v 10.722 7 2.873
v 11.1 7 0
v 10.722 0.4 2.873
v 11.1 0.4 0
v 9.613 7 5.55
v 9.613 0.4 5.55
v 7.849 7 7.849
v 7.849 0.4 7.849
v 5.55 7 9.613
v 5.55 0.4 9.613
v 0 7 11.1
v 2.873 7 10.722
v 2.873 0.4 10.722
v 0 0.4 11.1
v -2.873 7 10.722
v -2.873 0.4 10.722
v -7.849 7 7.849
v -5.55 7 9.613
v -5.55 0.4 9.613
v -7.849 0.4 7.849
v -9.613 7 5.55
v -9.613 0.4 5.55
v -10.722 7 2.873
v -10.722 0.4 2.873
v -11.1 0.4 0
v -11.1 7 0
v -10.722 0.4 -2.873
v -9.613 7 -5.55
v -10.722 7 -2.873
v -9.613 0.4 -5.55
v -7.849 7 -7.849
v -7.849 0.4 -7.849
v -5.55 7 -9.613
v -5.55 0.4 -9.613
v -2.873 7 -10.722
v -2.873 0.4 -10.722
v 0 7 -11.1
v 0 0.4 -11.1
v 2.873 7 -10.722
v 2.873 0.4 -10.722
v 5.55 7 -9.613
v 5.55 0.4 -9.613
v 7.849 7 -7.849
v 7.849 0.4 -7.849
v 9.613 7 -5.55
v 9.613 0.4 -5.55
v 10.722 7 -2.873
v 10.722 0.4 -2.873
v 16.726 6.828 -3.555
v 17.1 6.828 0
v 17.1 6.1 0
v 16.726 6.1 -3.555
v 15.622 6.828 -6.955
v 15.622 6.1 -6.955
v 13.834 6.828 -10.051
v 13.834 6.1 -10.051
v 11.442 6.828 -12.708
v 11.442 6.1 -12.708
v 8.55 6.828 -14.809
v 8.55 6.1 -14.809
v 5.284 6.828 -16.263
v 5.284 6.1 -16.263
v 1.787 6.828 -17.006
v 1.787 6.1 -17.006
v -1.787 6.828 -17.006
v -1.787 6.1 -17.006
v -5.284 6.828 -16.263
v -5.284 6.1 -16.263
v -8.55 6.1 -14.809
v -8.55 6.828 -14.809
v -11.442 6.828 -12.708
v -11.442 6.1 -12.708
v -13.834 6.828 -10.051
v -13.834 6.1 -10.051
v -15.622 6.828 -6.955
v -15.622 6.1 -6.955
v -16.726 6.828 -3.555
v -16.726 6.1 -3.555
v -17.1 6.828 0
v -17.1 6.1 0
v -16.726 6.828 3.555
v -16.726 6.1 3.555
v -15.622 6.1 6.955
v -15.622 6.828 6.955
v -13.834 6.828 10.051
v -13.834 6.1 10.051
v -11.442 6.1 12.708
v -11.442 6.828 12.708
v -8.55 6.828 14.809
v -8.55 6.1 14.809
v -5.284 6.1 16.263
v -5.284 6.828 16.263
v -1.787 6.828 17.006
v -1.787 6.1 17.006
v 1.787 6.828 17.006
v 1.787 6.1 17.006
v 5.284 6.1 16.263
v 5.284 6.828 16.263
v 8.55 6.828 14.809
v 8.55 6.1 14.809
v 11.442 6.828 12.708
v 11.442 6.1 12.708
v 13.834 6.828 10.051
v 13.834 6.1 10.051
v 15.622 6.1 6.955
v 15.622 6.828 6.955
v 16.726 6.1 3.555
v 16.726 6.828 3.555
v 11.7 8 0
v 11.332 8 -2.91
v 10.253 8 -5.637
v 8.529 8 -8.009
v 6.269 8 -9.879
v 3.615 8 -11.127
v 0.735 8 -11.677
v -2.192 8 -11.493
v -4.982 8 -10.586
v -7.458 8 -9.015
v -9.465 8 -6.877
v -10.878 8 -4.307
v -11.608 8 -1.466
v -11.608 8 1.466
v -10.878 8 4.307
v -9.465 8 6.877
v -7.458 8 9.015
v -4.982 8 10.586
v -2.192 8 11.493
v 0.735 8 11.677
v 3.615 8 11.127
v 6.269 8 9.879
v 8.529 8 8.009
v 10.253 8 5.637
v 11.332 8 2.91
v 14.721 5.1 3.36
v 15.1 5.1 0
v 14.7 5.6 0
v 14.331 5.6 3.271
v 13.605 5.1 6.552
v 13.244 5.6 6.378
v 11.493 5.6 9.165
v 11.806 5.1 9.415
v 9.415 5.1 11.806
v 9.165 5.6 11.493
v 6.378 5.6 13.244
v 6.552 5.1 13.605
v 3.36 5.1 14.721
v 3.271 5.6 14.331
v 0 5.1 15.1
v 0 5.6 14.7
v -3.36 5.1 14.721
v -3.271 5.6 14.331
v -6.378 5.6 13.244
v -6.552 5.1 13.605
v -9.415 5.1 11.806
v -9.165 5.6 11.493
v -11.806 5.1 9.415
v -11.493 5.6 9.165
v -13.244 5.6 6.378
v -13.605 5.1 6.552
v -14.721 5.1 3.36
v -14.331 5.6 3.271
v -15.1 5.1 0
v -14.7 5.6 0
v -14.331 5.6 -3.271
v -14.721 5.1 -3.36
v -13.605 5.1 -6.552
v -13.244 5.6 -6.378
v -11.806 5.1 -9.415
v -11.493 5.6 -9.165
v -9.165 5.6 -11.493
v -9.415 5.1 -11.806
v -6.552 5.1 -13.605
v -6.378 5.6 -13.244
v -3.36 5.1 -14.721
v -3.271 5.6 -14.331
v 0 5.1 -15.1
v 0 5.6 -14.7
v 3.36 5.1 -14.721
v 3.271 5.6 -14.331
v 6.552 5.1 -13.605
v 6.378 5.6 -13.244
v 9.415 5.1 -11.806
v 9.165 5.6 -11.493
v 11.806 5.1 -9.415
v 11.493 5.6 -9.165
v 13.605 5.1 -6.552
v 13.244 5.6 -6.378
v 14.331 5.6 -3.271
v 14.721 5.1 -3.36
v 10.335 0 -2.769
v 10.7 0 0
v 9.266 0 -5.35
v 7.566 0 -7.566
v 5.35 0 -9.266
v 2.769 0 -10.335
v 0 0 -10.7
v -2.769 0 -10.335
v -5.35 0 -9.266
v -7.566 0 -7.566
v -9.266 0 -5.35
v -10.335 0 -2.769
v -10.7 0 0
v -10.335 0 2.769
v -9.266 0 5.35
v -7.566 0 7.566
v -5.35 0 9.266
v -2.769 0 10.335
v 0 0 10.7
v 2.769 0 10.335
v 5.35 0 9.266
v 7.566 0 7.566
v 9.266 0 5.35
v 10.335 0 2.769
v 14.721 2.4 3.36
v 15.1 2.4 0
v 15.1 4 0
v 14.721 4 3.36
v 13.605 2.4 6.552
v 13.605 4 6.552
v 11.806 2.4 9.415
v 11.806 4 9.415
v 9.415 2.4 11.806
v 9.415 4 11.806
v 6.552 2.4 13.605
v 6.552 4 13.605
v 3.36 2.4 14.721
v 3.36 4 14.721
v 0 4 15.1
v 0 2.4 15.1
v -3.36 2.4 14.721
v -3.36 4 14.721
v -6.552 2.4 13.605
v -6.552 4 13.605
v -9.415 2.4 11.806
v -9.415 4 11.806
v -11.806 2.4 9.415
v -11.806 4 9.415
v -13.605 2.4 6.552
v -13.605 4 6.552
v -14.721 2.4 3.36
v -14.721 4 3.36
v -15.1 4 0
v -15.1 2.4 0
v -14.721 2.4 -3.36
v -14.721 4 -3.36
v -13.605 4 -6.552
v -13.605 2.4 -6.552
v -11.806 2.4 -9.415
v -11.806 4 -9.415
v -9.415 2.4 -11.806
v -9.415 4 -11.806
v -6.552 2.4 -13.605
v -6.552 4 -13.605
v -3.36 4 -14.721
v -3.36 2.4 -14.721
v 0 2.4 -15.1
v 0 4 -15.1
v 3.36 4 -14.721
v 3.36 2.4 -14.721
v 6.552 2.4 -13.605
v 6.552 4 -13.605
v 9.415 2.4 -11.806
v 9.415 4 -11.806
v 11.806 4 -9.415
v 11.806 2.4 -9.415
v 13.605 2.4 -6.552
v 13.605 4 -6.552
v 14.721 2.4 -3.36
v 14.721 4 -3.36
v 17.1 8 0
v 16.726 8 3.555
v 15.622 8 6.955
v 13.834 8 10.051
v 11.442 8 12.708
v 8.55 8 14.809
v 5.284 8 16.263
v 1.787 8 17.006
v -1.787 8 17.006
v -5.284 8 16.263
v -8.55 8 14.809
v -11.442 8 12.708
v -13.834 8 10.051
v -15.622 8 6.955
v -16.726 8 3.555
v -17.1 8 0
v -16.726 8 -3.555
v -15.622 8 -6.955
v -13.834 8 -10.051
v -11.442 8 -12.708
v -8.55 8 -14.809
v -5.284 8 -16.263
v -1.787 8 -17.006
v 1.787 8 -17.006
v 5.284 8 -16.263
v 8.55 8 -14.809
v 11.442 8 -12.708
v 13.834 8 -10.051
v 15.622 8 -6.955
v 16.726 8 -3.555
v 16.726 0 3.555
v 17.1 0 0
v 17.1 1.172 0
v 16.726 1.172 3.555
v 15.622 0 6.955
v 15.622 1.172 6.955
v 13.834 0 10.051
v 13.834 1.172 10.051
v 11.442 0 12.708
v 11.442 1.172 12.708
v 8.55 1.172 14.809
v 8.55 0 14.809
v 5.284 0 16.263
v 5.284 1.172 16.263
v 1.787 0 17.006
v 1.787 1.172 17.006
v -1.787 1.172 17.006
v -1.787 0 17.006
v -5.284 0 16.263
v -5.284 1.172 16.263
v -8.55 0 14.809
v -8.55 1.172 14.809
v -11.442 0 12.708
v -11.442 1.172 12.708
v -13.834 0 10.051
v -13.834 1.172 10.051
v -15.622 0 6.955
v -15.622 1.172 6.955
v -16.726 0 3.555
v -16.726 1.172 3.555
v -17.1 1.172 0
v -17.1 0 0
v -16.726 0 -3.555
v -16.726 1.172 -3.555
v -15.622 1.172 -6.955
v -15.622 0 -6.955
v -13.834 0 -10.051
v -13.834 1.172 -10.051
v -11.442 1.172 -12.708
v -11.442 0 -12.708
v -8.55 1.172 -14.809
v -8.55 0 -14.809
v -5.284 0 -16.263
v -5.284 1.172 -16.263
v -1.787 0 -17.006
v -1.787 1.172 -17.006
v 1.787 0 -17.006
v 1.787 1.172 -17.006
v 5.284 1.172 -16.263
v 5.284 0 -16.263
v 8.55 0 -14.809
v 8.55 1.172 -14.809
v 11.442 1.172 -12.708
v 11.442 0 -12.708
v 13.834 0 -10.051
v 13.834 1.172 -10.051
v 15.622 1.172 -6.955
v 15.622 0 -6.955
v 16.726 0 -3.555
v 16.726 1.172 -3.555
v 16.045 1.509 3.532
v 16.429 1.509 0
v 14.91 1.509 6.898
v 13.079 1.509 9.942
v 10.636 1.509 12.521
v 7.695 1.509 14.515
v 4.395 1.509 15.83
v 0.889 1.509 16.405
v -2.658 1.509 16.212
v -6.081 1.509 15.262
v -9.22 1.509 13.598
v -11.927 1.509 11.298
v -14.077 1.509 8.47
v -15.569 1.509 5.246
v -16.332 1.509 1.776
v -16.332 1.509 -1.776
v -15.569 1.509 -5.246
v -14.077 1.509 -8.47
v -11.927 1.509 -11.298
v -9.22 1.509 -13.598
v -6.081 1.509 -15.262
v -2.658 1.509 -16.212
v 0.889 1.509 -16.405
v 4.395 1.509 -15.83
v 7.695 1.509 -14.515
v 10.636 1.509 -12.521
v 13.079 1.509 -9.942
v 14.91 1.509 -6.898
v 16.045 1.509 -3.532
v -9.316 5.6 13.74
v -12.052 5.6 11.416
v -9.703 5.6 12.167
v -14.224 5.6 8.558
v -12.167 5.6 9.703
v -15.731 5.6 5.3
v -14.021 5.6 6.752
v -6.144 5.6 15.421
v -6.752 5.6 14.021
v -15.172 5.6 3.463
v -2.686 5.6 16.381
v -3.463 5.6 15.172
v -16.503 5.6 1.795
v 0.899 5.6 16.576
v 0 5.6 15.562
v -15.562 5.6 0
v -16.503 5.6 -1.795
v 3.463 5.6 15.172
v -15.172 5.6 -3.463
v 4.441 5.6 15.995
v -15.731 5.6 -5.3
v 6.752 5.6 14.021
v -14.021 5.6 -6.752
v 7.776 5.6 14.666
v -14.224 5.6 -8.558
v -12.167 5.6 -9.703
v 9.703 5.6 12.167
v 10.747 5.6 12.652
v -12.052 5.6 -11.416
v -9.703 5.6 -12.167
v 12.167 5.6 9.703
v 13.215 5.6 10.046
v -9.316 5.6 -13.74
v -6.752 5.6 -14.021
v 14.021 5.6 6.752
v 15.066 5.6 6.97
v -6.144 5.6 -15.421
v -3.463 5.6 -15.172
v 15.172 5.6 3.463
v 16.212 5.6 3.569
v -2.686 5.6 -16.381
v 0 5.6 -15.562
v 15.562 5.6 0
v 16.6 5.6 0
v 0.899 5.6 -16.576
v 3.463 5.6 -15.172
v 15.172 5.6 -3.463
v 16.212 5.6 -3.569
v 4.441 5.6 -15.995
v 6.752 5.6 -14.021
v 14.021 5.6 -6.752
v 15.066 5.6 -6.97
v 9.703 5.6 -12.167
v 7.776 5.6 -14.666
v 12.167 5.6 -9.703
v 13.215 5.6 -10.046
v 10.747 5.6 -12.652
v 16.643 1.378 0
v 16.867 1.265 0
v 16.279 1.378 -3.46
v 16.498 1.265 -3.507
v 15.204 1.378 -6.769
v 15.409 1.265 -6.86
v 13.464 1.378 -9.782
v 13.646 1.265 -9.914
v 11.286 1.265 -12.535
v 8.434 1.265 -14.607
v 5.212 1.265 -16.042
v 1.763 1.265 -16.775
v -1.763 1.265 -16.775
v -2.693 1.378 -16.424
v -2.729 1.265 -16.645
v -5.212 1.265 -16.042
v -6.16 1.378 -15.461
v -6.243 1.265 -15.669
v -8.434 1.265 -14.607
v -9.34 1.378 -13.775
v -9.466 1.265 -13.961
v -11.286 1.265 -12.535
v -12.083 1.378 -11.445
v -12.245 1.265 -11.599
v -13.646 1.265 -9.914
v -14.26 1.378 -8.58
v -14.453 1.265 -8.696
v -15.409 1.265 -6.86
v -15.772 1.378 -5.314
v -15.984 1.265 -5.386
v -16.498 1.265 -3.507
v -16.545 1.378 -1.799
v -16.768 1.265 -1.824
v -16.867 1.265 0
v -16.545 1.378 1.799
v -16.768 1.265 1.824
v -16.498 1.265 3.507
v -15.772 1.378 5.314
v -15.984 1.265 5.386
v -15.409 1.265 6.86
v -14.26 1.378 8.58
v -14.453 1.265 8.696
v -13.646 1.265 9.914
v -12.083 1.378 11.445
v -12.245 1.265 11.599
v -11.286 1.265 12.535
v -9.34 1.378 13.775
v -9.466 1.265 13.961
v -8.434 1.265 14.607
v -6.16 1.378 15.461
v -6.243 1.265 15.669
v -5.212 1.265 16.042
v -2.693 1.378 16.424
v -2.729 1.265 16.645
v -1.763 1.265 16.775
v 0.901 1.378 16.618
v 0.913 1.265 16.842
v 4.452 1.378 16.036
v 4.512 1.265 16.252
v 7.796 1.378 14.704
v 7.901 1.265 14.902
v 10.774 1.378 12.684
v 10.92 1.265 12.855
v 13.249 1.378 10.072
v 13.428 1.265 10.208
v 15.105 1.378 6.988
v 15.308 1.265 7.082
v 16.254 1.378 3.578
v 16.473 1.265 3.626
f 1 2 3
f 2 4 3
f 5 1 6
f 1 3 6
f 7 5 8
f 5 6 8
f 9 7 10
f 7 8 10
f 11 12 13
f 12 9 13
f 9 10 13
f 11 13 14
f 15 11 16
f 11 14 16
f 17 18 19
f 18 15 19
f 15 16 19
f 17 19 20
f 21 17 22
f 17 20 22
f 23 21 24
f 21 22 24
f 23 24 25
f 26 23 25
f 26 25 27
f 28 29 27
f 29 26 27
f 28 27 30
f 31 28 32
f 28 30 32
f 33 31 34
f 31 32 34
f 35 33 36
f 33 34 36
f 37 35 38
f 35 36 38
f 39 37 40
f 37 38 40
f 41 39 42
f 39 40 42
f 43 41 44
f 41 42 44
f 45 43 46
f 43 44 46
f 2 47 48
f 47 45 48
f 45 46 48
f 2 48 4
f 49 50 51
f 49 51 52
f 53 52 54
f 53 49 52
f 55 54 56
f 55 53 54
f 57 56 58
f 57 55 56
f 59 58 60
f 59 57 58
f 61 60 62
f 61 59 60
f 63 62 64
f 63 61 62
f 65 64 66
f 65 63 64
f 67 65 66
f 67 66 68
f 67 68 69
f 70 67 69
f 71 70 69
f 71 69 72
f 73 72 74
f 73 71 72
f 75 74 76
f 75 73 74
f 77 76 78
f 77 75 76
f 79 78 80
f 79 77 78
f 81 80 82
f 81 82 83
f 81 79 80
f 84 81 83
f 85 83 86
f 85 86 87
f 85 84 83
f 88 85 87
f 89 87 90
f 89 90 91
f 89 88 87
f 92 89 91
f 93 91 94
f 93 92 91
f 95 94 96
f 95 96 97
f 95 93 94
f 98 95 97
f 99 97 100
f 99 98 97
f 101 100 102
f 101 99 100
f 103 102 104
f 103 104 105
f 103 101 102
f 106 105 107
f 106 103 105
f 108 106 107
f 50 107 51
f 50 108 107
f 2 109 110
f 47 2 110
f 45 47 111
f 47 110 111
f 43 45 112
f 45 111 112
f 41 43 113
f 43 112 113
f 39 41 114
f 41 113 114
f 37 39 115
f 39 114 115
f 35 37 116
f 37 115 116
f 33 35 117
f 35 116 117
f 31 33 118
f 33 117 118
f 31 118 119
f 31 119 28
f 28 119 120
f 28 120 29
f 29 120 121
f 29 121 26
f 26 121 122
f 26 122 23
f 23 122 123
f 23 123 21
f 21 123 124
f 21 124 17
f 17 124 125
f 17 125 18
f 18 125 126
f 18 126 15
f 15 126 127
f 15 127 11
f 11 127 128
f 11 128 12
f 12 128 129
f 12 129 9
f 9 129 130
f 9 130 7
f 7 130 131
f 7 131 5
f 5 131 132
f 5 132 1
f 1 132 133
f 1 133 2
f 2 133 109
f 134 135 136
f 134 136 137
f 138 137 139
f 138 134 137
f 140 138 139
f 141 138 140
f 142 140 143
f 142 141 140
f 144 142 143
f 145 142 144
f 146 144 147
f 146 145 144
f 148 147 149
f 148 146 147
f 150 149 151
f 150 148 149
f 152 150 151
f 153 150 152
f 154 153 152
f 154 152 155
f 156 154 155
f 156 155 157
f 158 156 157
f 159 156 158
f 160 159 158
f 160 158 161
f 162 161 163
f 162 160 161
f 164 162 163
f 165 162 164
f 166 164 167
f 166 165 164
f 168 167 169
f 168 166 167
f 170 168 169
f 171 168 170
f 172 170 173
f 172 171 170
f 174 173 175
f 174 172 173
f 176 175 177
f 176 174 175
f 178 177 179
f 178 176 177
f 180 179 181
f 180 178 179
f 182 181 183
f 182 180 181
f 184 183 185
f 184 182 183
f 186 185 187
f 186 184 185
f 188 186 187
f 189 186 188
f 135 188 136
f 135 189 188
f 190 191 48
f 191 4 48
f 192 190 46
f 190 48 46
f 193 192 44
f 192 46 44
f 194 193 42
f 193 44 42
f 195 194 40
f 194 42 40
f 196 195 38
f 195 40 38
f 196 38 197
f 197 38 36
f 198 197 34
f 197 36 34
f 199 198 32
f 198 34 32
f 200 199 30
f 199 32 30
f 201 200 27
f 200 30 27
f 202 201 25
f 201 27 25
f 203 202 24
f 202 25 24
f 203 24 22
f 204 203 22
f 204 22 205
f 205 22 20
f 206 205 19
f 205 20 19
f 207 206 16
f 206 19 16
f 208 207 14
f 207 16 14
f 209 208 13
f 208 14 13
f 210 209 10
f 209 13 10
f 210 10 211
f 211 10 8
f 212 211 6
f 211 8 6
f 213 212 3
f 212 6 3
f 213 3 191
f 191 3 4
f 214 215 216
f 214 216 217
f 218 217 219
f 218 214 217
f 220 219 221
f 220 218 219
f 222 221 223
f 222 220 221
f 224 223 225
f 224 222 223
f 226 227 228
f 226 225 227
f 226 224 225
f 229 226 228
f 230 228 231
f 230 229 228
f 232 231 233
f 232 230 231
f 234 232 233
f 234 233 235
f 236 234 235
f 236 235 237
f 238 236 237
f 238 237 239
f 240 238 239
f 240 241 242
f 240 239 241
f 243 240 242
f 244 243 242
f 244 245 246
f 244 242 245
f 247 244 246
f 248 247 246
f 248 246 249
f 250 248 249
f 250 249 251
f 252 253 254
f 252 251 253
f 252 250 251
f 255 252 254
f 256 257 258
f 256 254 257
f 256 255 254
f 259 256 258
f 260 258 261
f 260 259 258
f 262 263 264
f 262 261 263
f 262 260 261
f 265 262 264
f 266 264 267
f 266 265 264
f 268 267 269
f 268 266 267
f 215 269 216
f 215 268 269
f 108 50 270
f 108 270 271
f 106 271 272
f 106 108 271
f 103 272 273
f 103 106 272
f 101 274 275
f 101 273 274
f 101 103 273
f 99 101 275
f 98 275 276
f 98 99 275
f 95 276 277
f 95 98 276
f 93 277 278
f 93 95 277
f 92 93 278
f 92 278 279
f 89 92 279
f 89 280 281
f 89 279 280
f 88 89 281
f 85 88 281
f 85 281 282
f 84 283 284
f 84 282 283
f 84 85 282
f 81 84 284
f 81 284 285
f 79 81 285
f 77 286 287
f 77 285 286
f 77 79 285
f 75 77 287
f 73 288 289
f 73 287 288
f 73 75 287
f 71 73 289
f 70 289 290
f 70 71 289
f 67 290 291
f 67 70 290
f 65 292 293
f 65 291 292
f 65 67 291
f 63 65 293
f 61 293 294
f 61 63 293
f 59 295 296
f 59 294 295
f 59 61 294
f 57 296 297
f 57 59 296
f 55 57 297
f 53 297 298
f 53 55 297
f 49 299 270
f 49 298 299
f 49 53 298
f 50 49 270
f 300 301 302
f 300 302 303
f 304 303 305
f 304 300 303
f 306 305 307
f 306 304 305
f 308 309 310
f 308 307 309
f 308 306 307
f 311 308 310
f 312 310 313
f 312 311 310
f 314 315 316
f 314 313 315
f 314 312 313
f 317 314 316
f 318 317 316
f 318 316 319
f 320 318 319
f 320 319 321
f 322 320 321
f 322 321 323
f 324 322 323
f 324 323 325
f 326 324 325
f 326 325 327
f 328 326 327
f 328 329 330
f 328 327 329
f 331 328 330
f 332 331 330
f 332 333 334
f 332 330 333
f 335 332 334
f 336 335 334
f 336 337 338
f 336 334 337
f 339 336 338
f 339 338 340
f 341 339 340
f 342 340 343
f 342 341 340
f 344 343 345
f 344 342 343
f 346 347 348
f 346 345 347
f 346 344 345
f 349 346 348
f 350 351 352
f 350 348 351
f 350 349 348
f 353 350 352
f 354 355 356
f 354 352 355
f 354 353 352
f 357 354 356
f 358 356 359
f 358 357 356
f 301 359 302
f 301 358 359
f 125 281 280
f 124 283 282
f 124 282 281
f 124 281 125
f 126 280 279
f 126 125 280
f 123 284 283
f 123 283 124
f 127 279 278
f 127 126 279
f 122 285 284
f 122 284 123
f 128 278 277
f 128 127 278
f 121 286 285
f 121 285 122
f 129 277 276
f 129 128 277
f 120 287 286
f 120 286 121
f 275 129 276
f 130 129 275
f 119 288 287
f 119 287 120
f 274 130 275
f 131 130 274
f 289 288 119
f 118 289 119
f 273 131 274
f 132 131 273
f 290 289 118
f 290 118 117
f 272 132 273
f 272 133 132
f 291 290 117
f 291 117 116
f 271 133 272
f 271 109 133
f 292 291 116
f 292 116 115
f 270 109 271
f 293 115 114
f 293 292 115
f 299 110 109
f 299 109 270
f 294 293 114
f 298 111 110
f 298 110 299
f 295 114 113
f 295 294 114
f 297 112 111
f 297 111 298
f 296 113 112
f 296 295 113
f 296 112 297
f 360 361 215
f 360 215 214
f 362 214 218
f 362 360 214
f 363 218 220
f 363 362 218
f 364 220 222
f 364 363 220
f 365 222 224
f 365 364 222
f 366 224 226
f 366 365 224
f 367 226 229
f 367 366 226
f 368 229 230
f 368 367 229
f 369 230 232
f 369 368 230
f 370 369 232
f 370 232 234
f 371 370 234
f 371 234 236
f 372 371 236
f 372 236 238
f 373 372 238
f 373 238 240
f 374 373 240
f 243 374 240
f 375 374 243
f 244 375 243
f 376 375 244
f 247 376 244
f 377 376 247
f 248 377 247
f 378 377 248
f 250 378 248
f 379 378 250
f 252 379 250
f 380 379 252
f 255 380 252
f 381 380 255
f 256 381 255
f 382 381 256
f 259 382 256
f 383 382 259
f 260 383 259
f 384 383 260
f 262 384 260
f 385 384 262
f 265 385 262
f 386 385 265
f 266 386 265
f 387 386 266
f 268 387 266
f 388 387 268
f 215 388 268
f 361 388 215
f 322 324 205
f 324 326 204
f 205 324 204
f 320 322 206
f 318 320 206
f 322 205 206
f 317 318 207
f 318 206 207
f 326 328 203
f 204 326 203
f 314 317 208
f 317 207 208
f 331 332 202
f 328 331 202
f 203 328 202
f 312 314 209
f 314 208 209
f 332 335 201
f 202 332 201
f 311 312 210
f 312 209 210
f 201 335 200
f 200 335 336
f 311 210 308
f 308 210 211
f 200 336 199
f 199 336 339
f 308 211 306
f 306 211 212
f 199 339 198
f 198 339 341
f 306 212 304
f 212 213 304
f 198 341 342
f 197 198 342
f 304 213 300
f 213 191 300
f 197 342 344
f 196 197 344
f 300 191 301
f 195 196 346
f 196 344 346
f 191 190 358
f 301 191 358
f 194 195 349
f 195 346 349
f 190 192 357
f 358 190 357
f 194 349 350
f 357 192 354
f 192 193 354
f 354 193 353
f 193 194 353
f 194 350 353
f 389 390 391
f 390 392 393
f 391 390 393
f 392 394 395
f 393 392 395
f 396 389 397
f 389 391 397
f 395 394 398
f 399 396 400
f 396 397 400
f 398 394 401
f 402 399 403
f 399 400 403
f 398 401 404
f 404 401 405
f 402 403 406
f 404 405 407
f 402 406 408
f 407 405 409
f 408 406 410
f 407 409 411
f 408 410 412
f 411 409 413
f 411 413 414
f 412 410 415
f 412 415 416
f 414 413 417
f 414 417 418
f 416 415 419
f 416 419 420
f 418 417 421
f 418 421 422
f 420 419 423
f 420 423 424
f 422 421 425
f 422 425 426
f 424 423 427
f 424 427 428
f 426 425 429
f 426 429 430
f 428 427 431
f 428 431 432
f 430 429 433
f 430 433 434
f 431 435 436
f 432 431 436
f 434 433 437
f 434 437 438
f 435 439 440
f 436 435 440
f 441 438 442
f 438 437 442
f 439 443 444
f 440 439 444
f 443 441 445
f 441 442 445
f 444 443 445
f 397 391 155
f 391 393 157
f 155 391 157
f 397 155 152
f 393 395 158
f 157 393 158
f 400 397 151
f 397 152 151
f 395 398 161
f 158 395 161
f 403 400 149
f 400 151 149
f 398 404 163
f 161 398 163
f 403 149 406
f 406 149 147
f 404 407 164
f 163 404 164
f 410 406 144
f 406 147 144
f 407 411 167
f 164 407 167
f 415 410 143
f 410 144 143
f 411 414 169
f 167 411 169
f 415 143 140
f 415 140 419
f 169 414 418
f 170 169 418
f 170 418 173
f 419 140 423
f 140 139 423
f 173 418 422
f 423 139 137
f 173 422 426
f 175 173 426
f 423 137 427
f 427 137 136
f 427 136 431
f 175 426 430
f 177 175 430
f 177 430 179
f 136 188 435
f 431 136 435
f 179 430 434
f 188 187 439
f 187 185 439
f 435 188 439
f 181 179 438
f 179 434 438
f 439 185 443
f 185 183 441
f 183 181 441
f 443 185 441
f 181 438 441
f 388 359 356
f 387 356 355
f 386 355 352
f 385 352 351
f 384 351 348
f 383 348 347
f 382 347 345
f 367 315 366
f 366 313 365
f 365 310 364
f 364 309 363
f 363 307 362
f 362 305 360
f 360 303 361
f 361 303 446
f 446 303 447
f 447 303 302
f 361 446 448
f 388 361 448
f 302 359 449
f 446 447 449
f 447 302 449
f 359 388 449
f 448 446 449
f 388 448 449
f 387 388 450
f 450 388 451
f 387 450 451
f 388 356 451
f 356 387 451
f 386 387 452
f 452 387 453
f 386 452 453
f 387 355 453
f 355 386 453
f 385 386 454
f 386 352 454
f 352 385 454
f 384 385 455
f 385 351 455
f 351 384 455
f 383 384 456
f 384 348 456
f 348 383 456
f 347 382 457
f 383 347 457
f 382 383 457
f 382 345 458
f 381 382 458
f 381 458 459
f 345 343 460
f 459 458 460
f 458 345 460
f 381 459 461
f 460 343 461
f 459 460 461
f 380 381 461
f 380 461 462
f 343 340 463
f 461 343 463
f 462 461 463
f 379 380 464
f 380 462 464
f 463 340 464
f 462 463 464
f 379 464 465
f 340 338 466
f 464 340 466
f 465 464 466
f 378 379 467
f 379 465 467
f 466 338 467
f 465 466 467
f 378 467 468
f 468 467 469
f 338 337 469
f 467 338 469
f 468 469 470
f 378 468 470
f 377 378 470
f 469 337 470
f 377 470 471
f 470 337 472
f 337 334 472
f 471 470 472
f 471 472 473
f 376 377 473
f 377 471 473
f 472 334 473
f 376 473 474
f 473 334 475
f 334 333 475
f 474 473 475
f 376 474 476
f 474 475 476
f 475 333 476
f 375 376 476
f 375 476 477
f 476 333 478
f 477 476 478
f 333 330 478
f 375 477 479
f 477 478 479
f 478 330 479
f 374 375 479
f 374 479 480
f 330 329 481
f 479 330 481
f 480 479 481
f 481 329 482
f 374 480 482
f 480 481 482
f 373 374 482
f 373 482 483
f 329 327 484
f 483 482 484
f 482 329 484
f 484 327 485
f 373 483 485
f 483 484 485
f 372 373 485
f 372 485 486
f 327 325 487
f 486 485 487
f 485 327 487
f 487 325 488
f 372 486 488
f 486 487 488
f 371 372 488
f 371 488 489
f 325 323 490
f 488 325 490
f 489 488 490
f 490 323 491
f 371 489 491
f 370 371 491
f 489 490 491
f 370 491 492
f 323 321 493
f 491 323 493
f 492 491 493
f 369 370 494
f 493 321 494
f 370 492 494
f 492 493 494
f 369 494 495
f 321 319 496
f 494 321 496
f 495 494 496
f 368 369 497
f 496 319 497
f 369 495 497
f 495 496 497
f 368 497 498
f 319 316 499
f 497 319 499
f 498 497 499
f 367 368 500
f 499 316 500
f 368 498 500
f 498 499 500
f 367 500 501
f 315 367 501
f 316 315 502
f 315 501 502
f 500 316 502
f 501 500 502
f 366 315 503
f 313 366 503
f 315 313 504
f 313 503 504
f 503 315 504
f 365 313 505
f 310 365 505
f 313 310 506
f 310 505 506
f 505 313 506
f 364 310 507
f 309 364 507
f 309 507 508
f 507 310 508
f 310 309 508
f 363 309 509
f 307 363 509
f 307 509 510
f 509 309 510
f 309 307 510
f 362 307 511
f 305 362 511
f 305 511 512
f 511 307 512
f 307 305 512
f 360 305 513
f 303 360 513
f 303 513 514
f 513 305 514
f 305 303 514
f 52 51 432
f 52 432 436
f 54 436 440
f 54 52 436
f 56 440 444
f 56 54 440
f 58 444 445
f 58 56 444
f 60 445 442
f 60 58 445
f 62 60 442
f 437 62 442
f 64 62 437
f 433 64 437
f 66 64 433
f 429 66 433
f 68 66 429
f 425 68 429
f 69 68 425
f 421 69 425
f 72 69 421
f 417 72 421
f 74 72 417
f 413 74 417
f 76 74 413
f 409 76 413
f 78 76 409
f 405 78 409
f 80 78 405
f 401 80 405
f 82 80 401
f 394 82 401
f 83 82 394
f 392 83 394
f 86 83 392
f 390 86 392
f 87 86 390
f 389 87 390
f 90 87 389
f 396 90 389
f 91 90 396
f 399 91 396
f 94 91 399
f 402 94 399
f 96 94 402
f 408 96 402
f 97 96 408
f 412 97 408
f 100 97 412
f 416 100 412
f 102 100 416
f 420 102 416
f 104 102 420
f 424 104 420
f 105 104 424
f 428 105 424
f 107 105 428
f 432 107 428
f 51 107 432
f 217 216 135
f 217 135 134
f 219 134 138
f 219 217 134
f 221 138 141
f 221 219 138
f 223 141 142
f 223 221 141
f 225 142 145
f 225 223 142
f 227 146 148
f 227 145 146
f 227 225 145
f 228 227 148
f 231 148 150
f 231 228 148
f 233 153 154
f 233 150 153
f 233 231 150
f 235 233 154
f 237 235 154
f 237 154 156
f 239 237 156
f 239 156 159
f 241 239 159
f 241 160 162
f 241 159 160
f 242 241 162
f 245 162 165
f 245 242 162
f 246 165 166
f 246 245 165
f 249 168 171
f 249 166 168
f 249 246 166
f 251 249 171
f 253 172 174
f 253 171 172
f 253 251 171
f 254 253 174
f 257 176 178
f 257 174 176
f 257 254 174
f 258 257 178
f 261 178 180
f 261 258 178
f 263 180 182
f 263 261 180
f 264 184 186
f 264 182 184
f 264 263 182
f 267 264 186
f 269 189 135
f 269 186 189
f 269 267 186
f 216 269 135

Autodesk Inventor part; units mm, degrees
ref_plane "YZ Plane" through (0, 0, 0) normal (1, 0, 0) x (0, 1, 0)
ref_plane "XZ Plane" through (0, 0, 0) normal (0, 1, 0) x (-1, 0, 0)
ref_plane "XY Plane" through (0, 0, 0) normal (0, 0, 1) x (1, 0, 0)
sketch "Sketch1" plane through (0, 0, 0) normal (0, 0, 1) x (1, 0, 0)
  line L0 (11.1, 0) -> (17.1, 0)
  line L1 (17.1, 0) -> (17.1, 8) construction
  line L2 (17.1, 8) -> (11.1, 8) construction
  line L3 (11.1, 8) -> (11.1, 0) construction
  line L4 (0, 0) -> (0, 7.3935) construction
  line L5 (17.1, 8) -> (17.1, 6.8284)
  line L6 (17.1, 1.1716) -> (17.1, 0)
  circle A0 centre (18.1, 4) radius 3
  line L7 (15.1, 5.6) -> (15.1, 2.4) construction
  line L8 (15.1, 2.4) -> (16.4287, 1.5087)
  line L9 (14.7, 5.6) -> (16.6, 5.6)
  line L10 (16.6, 5.6) -> (17.1, 6.1)
  line L11 (17.1, 6.1) -> (17.1, 6.8284)
  line L12 (14.7, 5.6) -> (15.1, 5.1)
  line L13 (15.1, 5.1) -> (15.1, 2.4)
  line L14 (11.7, 8) -> (11.1, 7)
  line L15 (11.1, 0.4) -> (10.7, 0)
  line L16 (10.7, 0) -> (11.1, 0)
  line L17 (11.7, 8) -> (17.1, 8)
  line L18 (11.1, 7) -> (11.1, 0.4)
  point P0 (17.1, 4)
  point P1 (15.5286, 5.5452)
  point P2 (15.5286, 2.4548)
  point P3 (15.1, 4)
  point P4 (16.3509, 6.4373)
  dimension "d13" = 6
  dimension "d6" = 8
  dimension "d7" = 11.1
  dimension "d12" = 1
  dimension "d14" = 6
  dimension "d17" = 3.2
  dimension "d18" = 1.9
  dimension "d19" = 135
  dimension "d24" = 0.5
  dimension "d25" = 0.5
  dimension "d27" = 0.6
  dimension "d28" = 1
  dimension "d29" = 0.4
  dimension "d30" = 0.4
revolve "Revolution1" add sketch "Sketch1" angle 360 about axis through (0, 0, 0) along (0, 1, 0) picked at (16.0469, 5.7737) contours L16 L15 L18 L14 L17 L5 A0 L9 L12 L13 L8 L6 L0 | L11 L10 L9 A0
properties part number "pully 16mmx30mmx6mm"
